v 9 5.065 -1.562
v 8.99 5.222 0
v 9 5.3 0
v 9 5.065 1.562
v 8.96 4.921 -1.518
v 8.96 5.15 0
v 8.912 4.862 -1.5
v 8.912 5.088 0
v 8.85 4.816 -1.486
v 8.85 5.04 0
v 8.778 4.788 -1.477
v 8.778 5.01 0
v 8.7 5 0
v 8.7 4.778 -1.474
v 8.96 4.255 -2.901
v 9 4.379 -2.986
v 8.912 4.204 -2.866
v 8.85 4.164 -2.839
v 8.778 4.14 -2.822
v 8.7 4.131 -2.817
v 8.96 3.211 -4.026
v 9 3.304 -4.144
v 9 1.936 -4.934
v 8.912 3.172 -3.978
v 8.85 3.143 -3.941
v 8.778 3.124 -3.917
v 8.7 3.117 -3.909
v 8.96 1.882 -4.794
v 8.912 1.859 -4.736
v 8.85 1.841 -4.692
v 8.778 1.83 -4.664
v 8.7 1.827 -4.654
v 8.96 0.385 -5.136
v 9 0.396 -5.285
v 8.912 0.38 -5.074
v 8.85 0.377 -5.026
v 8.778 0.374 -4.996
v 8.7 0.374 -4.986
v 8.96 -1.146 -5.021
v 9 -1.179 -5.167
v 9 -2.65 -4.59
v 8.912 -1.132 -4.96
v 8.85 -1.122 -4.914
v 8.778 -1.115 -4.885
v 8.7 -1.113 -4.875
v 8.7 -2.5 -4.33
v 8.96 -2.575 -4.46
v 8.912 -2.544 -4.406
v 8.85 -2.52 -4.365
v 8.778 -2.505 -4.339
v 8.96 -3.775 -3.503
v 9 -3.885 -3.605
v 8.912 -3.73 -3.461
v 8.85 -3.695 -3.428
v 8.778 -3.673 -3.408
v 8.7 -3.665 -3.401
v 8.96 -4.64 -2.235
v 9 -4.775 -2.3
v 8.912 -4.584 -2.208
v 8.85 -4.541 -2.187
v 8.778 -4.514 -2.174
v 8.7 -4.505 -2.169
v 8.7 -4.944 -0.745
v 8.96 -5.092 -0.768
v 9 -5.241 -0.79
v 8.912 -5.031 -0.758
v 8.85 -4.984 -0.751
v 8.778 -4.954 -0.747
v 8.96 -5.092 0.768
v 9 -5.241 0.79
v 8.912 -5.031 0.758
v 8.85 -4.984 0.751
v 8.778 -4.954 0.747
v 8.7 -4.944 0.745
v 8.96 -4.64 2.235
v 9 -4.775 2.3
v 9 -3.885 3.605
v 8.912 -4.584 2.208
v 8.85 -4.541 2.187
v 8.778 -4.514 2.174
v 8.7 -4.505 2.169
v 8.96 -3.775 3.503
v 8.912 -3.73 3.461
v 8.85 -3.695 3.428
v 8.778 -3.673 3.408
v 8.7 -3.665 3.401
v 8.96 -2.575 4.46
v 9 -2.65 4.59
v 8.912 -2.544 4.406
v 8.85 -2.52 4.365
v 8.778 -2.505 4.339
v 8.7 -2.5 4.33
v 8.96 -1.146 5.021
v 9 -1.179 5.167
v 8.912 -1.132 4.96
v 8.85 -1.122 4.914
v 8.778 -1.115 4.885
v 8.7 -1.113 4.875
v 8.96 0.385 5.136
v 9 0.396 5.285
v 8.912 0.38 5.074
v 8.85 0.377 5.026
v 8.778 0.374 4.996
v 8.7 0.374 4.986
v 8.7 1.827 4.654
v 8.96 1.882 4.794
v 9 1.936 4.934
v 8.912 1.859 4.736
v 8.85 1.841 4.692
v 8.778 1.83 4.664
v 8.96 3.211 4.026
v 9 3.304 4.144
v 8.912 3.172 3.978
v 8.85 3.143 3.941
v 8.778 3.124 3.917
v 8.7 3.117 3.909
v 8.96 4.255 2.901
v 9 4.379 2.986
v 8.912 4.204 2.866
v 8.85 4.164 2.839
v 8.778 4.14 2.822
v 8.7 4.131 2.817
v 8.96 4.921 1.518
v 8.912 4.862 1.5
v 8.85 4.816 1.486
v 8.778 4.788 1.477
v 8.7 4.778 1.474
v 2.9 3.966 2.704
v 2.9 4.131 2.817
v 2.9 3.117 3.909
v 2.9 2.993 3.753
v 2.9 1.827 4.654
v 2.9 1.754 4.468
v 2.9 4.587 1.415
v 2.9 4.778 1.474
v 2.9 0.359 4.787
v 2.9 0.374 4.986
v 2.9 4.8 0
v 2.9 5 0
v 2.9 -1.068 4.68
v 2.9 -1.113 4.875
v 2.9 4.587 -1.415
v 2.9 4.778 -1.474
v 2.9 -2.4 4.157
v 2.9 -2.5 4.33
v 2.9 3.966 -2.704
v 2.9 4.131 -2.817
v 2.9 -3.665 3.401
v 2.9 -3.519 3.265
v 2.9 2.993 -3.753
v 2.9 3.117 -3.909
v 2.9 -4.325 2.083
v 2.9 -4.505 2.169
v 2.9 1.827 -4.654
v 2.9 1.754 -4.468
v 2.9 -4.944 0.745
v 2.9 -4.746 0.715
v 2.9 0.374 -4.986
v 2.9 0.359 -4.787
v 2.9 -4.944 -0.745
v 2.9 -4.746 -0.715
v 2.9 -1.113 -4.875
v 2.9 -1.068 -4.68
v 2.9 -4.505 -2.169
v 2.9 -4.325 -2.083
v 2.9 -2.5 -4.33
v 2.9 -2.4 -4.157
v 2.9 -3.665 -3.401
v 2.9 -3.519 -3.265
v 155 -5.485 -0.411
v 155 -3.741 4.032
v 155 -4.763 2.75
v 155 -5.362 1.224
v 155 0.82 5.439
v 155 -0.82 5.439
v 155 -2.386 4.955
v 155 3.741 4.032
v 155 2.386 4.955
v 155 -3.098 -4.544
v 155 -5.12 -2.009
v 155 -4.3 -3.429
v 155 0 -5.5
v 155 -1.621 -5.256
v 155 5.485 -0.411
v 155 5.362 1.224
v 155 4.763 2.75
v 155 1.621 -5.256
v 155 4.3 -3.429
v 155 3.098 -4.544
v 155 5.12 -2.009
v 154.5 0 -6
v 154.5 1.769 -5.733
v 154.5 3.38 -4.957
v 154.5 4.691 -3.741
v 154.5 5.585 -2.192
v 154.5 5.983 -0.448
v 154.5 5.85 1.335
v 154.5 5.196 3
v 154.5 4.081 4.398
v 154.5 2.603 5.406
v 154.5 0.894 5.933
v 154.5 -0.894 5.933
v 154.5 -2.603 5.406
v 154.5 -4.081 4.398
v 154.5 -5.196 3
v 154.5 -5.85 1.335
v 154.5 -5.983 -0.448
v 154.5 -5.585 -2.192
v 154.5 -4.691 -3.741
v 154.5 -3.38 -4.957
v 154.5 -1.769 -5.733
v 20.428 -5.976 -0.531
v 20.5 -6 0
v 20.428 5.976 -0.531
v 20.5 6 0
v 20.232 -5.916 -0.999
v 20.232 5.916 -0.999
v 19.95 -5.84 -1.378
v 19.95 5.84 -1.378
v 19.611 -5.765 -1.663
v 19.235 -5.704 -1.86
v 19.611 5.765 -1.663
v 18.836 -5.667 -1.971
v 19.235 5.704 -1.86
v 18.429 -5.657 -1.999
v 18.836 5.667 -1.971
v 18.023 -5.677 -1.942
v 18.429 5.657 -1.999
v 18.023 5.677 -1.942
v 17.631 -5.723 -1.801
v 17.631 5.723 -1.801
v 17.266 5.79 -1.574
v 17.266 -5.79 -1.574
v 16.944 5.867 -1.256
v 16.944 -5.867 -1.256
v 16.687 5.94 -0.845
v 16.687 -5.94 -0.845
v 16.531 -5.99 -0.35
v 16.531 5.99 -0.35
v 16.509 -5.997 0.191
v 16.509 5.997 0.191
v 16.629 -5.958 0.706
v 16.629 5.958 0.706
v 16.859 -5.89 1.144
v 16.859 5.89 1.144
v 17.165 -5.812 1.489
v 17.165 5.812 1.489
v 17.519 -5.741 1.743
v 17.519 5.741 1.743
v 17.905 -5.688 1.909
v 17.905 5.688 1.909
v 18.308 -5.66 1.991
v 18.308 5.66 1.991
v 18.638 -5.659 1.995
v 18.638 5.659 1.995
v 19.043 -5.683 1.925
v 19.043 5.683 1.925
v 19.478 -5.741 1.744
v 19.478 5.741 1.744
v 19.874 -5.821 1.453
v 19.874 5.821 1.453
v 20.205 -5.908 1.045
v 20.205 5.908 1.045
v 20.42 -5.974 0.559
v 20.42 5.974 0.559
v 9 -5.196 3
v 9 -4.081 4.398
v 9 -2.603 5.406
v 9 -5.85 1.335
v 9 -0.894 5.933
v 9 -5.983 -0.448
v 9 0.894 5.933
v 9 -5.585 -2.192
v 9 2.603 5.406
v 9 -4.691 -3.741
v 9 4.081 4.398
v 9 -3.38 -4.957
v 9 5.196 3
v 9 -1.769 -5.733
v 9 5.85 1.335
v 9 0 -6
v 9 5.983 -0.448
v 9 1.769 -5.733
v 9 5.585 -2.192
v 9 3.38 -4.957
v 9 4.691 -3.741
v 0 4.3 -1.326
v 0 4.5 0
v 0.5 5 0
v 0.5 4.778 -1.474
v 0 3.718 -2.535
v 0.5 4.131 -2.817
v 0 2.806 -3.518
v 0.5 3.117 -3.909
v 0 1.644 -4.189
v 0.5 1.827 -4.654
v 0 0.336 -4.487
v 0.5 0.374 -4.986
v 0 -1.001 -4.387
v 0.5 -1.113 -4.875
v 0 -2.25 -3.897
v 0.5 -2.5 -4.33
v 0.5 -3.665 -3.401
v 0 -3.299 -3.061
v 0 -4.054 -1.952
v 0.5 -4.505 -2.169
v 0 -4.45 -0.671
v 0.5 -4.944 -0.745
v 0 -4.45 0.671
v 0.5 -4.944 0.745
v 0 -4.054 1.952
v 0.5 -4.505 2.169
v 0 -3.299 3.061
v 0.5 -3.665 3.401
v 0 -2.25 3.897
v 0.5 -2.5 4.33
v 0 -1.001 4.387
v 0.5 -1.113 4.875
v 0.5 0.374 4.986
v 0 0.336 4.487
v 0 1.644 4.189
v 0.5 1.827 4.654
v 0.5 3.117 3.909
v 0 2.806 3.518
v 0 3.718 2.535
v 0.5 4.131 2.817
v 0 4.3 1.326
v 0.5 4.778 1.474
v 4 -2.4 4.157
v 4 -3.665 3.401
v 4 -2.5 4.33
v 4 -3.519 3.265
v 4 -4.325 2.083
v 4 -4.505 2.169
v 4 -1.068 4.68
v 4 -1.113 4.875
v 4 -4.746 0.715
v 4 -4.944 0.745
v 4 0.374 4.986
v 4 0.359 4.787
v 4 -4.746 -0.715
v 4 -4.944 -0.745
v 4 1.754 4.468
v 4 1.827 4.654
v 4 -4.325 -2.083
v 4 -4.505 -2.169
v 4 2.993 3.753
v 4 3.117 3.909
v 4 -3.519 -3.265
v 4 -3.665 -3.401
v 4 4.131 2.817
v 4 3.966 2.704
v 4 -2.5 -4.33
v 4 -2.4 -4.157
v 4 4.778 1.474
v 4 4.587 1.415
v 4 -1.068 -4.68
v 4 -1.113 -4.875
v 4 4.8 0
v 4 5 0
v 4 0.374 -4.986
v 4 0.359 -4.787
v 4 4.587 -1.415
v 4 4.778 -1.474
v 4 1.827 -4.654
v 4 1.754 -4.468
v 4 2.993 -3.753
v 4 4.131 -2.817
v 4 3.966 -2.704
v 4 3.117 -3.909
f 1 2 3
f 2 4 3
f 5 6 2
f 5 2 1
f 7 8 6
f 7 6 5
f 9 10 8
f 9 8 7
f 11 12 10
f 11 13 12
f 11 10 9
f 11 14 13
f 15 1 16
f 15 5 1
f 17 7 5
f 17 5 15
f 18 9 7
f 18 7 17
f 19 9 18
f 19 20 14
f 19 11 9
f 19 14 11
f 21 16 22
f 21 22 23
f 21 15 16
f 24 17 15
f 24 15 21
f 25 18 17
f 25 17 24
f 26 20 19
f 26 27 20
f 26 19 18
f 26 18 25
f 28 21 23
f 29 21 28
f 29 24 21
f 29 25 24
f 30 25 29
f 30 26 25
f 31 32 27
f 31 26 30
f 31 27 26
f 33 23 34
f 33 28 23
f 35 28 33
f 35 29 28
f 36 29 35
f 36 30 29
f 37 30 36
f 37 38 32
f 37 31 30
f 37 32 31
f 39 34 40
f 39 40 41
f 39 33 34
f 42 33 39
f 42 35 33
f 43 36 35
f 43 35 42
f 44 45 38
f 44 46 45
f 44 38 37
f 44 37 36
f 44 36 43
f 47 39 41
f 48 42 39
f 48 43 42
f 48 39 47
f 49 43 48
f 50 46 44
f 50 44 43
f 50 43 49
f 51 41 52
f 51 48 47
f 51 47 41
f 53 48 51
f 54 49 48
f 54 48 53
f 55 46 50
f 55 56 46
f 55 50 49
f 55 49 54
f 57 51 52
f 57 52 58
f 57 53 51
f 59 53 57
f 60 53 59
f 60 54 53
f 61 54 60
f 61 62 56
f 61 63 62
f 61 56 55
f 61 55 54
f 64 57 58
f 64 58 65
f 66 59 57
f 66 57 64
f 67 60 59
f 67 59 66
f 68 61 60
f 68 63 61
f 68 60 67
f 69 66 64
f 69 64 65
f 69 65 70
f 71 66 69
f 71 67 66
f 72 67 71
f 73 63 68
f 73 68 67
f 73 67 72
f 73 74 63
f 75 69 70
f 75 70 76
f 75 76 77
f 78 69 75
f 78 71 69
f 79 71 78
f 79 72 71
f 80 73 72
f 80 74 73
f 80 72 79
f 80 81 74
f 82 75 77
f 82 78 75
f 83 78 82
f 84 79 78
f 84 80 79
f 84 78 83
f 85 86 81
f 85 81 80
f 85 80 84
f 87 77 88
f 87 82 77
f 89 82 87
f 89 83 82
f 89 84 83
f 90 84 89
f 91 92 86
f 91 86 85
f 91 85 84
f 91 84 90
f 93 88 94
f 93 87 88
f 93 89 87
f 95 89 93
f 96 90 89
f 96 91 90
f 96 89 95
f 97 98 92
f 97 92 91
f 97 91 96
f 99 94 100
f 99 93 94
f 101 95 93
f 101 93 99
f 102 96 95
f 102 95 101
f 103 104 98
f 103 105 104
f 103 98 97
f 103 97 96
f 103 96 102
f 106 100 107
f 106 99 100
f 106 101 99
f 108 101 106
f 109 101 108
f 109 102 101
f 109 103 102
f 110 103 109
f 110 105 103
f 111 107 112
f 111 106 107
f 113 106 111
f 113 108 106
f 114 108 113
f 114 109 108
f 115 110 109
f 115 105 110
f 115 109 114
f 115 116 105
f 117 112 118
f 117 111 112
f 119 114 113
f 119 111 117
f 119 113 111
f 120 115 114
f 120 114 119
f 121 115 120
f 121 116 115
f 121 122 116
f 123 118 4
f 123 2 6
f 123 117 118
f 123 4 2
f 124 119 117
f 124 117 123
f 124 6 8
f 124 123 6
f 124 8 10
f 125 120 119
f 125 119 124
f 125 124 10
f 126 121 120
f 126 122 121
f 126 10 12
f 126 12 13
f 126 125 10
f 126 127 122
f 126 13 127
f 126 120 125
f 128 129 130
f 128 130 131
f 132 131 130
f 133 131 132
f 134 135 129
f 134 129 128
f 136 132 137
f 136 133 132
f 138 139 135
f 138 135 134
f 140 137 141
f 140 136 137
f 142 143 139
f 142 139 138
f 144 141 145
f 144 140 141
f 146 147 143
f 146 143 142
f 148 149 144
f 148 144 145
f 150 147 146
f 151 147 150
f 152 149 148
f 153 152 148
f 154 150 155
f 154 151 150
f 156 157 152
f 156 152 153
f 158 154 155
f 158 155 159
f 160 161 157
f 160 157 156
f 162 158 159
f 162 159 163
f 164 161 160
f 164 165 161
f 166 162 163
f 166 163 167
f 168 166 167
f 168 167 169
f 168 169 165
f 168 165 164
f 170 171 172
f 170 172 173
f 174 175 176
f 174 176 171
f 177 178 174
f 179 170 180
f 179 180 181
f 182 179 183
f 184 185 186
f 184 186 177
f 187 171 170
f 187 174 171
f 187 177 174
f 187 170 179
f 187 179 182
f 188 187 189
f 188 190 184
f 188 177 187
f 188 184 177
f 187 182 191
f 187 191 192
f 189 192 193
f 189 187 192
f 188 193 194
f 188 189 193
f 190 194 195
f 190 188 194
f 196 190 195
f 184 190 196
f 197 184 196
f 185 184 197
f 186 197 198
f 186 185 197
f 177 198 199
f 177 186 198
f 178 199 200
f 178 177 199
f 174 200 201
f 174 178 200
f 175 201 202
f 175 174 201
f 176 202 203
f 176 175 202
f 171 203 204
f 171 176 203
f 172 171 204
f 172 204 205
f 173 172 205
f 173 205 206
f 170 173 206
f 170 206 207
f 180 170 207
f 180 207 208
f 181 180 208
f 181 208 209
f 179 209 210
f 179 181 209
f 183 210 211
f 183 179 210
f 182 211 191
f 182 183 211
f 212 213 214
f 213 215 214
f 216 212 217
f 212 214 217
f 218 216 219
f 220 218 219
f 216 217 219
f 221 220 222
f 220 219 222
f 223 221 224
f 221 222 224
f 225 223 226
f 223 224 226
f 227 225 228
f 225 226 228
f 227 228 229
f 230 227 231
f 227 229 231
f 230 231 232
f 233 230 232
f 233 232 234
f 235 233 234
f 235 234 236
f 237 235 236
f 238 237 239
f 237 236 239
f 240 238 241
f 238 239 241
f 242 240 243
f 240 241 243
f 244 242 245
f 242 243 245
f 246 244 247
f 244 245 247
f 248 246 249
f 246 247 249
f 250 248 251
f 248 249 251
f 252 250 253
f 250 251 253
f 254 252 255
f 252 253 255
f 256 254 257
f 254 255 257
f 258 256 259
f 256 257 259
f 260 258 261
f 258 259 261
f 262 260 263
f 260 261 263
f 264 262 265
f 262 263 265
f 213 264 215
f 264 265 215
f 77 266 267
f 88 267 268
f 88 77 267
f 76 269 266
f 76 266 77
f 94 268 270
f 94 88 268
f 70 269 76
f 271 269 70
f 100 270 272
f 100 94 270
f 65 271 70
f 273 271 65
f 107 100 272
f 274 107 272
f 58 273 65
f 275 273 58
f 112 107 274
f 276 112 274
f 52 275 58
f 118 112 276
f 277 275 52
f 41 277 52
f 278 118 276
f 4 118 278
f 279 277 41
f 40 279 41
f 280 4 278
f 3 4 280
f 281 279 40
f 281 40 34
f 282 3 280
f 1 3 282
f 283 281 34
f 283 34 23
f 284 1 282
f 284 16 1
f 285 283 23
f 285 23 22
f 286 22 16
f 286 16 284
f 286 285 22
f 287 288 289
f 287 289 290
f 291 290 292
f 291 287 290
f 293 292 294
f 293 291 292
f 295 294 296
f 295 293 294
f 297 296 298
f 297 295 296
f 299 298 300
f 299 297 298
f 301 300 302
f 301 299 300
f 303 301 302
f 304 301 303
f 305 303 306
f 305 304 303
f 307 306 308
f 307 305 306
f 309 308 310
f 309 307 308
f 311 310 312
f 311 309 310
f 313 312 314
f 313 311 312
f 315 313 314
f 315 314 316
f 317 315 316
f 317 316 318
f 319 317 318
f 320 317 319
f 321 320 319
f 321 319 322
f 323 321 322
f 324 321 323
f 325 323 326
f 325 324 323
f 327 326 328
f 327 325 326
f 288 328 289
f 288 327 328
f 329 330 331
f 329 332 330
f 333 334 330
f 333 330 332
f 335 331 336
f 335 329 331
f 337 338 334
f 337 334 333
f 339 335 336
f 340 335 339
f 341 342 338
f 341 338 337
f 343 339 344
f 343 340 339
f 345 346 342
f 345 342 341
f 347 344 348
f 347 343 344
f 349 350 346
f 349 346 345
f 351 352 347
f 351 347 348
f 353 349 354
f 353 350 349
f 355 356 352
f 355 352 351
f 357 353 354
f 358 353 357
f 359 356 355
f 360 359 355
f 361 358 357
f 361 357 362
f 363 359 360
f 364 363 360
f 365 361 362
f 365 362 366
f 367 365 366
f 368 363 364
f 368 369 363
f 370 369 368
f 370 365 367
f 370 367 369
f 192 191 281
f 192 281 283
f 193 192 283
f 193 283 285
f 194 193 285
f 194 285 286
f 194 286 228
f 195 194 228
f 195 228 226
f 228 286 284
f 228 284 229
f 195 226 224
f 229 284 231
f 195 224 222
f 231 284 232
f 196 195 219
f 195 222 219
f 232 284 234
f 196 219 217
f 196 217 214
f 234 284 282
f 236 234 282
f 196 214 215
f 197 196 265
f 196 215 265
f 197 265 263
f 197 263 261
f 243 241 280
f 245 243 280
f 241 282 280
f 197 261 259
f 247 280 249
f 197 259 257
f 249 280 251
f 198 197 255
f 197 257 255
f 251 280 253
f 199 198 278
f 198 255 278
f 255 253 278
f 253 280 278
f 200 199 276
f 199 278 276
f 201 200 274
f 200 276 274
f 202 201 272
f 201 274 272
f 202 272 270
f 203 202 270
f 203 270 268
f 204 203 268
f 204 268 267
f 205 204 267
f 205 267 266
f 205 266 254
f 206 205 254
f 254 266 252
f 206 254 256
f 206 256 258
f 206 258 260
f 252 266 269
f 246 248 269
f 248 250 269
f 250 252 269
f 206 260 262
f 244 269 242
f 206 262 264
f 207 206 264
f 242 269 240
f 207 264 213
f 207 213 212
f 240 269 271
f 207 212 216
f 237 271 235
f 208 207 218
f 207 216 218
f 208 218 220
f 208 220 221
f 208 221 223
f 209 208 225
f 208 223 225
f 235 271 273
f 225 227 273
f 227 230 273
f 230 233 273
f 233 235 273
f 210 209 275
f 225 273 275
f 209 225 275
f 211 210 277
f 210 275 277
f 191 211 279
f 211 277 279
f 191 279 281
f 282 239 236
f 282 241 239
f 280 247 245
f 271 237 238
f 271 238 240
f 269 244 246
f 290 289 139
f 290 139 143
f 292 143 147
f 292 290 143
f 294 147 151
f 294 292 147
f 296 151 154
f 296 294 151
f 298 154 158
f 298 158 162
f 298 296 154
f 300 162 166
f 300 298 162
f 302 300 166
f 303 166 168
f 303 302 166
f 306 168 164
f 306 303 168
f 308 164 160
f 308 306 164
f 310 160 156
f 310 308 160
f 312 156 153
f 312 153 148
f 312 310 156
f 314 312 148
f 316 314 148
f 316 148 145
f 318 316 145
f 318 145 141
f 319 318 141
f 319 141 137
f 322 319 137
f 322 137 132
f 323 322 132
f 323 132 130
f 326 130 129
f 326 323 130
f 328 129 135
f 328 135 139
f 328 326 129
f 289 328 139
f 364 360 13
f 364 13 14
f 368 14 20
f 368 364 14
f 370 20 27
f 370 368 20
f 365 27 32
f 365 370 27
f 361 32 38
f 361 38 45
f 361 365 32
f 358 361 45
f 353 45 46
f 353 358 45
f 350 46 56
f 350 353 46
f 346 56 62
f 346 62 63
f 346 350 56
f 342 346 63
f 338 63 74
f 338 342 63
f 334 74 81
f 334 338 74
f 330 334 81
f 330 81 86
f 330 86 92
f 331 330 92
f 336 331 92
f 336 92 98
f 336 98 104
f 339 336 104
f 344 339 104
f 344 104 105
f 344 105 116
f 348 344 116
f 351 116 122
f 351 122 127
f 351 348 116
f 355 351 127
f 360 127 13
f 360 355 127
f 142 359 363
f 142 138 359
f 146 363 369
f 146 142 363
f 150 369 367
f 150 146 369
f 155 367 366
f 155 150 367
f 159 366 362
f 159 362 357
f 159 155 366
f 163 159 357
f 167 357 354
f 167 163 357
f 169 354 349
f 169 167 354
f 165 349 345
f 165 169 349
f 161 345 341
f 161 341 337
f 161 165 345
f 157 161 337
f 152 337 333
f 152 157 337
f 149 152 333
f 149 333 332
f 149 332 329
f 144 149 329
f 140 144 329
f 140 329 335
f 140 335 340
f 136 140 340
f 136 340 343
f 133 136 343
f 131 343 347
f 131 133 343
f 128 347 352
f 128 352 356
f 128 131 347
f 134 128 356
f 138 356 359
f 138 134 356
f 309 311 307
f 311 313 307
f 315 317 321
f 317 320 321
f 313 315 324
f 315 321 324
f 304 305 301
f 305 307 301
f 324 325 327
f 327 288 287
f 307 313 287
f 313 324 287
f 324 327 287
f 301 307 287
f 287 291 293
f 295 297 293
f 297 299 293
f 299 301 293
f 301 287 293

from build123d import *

# Parameters (mm, degrees)
SKETCH1_R           = 6
BOSS_EXTRUDE1_DEPTH = 155
SKETCH3_R           = 2
CUT_EXTRUDE1_DEPTH  = 10
CHAMFER1_SIZE       = 0.5
FILLET1_R           = 0.3


with BuildPart() as part:
    # Sketch1 → Boss-Extrude1 (new body)
    with BuildSketch(Plane(origin=(0, 0, 0), x_dir=(0, 0, -1), z_dir=(1, 0, 0))):
        Circle(SKETCH1_R)
    extrude(amount=BOSS_EXTRUDE1_DEPTH)

    # Sketch2 → Cut-Revolve1 (revolve, cut)
    with BuildSketch(Plane.XY):
        Polygon((0, 5), (0, 6), (9, 6), (9, 5), (4, 5), (4, 4.8), (2.9, 4.8), (2.9, 5), align=None)
    revolve(axis=Axis((155, 0, 0), (-1, 0, 0)), mode=Mode.SUBTRACT)

    # Sketch3 → Cut-Extrude1 (cut, symmetric)
    with BuildSketch(Plane(origin=(0, 0, 0), x_dir=(1, 0, 0), z_dir=(0, 1, 0))):
        with Locations((18.5, 0)):
            Circle(SKETCH3_R)
    extrude(amount=CUT_EXTRUDE1_DEPTH, both=True, mode=Mode.SUBTRACT)

    # Chamfer1
    chamfer1_edges = [part.edges().sort_by_distance(p)[0] for p in [
        (155, 0, 6),
        (0, -5, 0),
    ]]
    chamfer(chamfer1_edges, length=CHAMFER1_SIZE)

    # Fillet1
    fillet1_edges = [part.edges().sort_by_distance(p)[0] for p in [
        (9, -5, 0),
    ]]
    fillet(fillet1_edges, radius=FILLET1_R)


solid = part.part
